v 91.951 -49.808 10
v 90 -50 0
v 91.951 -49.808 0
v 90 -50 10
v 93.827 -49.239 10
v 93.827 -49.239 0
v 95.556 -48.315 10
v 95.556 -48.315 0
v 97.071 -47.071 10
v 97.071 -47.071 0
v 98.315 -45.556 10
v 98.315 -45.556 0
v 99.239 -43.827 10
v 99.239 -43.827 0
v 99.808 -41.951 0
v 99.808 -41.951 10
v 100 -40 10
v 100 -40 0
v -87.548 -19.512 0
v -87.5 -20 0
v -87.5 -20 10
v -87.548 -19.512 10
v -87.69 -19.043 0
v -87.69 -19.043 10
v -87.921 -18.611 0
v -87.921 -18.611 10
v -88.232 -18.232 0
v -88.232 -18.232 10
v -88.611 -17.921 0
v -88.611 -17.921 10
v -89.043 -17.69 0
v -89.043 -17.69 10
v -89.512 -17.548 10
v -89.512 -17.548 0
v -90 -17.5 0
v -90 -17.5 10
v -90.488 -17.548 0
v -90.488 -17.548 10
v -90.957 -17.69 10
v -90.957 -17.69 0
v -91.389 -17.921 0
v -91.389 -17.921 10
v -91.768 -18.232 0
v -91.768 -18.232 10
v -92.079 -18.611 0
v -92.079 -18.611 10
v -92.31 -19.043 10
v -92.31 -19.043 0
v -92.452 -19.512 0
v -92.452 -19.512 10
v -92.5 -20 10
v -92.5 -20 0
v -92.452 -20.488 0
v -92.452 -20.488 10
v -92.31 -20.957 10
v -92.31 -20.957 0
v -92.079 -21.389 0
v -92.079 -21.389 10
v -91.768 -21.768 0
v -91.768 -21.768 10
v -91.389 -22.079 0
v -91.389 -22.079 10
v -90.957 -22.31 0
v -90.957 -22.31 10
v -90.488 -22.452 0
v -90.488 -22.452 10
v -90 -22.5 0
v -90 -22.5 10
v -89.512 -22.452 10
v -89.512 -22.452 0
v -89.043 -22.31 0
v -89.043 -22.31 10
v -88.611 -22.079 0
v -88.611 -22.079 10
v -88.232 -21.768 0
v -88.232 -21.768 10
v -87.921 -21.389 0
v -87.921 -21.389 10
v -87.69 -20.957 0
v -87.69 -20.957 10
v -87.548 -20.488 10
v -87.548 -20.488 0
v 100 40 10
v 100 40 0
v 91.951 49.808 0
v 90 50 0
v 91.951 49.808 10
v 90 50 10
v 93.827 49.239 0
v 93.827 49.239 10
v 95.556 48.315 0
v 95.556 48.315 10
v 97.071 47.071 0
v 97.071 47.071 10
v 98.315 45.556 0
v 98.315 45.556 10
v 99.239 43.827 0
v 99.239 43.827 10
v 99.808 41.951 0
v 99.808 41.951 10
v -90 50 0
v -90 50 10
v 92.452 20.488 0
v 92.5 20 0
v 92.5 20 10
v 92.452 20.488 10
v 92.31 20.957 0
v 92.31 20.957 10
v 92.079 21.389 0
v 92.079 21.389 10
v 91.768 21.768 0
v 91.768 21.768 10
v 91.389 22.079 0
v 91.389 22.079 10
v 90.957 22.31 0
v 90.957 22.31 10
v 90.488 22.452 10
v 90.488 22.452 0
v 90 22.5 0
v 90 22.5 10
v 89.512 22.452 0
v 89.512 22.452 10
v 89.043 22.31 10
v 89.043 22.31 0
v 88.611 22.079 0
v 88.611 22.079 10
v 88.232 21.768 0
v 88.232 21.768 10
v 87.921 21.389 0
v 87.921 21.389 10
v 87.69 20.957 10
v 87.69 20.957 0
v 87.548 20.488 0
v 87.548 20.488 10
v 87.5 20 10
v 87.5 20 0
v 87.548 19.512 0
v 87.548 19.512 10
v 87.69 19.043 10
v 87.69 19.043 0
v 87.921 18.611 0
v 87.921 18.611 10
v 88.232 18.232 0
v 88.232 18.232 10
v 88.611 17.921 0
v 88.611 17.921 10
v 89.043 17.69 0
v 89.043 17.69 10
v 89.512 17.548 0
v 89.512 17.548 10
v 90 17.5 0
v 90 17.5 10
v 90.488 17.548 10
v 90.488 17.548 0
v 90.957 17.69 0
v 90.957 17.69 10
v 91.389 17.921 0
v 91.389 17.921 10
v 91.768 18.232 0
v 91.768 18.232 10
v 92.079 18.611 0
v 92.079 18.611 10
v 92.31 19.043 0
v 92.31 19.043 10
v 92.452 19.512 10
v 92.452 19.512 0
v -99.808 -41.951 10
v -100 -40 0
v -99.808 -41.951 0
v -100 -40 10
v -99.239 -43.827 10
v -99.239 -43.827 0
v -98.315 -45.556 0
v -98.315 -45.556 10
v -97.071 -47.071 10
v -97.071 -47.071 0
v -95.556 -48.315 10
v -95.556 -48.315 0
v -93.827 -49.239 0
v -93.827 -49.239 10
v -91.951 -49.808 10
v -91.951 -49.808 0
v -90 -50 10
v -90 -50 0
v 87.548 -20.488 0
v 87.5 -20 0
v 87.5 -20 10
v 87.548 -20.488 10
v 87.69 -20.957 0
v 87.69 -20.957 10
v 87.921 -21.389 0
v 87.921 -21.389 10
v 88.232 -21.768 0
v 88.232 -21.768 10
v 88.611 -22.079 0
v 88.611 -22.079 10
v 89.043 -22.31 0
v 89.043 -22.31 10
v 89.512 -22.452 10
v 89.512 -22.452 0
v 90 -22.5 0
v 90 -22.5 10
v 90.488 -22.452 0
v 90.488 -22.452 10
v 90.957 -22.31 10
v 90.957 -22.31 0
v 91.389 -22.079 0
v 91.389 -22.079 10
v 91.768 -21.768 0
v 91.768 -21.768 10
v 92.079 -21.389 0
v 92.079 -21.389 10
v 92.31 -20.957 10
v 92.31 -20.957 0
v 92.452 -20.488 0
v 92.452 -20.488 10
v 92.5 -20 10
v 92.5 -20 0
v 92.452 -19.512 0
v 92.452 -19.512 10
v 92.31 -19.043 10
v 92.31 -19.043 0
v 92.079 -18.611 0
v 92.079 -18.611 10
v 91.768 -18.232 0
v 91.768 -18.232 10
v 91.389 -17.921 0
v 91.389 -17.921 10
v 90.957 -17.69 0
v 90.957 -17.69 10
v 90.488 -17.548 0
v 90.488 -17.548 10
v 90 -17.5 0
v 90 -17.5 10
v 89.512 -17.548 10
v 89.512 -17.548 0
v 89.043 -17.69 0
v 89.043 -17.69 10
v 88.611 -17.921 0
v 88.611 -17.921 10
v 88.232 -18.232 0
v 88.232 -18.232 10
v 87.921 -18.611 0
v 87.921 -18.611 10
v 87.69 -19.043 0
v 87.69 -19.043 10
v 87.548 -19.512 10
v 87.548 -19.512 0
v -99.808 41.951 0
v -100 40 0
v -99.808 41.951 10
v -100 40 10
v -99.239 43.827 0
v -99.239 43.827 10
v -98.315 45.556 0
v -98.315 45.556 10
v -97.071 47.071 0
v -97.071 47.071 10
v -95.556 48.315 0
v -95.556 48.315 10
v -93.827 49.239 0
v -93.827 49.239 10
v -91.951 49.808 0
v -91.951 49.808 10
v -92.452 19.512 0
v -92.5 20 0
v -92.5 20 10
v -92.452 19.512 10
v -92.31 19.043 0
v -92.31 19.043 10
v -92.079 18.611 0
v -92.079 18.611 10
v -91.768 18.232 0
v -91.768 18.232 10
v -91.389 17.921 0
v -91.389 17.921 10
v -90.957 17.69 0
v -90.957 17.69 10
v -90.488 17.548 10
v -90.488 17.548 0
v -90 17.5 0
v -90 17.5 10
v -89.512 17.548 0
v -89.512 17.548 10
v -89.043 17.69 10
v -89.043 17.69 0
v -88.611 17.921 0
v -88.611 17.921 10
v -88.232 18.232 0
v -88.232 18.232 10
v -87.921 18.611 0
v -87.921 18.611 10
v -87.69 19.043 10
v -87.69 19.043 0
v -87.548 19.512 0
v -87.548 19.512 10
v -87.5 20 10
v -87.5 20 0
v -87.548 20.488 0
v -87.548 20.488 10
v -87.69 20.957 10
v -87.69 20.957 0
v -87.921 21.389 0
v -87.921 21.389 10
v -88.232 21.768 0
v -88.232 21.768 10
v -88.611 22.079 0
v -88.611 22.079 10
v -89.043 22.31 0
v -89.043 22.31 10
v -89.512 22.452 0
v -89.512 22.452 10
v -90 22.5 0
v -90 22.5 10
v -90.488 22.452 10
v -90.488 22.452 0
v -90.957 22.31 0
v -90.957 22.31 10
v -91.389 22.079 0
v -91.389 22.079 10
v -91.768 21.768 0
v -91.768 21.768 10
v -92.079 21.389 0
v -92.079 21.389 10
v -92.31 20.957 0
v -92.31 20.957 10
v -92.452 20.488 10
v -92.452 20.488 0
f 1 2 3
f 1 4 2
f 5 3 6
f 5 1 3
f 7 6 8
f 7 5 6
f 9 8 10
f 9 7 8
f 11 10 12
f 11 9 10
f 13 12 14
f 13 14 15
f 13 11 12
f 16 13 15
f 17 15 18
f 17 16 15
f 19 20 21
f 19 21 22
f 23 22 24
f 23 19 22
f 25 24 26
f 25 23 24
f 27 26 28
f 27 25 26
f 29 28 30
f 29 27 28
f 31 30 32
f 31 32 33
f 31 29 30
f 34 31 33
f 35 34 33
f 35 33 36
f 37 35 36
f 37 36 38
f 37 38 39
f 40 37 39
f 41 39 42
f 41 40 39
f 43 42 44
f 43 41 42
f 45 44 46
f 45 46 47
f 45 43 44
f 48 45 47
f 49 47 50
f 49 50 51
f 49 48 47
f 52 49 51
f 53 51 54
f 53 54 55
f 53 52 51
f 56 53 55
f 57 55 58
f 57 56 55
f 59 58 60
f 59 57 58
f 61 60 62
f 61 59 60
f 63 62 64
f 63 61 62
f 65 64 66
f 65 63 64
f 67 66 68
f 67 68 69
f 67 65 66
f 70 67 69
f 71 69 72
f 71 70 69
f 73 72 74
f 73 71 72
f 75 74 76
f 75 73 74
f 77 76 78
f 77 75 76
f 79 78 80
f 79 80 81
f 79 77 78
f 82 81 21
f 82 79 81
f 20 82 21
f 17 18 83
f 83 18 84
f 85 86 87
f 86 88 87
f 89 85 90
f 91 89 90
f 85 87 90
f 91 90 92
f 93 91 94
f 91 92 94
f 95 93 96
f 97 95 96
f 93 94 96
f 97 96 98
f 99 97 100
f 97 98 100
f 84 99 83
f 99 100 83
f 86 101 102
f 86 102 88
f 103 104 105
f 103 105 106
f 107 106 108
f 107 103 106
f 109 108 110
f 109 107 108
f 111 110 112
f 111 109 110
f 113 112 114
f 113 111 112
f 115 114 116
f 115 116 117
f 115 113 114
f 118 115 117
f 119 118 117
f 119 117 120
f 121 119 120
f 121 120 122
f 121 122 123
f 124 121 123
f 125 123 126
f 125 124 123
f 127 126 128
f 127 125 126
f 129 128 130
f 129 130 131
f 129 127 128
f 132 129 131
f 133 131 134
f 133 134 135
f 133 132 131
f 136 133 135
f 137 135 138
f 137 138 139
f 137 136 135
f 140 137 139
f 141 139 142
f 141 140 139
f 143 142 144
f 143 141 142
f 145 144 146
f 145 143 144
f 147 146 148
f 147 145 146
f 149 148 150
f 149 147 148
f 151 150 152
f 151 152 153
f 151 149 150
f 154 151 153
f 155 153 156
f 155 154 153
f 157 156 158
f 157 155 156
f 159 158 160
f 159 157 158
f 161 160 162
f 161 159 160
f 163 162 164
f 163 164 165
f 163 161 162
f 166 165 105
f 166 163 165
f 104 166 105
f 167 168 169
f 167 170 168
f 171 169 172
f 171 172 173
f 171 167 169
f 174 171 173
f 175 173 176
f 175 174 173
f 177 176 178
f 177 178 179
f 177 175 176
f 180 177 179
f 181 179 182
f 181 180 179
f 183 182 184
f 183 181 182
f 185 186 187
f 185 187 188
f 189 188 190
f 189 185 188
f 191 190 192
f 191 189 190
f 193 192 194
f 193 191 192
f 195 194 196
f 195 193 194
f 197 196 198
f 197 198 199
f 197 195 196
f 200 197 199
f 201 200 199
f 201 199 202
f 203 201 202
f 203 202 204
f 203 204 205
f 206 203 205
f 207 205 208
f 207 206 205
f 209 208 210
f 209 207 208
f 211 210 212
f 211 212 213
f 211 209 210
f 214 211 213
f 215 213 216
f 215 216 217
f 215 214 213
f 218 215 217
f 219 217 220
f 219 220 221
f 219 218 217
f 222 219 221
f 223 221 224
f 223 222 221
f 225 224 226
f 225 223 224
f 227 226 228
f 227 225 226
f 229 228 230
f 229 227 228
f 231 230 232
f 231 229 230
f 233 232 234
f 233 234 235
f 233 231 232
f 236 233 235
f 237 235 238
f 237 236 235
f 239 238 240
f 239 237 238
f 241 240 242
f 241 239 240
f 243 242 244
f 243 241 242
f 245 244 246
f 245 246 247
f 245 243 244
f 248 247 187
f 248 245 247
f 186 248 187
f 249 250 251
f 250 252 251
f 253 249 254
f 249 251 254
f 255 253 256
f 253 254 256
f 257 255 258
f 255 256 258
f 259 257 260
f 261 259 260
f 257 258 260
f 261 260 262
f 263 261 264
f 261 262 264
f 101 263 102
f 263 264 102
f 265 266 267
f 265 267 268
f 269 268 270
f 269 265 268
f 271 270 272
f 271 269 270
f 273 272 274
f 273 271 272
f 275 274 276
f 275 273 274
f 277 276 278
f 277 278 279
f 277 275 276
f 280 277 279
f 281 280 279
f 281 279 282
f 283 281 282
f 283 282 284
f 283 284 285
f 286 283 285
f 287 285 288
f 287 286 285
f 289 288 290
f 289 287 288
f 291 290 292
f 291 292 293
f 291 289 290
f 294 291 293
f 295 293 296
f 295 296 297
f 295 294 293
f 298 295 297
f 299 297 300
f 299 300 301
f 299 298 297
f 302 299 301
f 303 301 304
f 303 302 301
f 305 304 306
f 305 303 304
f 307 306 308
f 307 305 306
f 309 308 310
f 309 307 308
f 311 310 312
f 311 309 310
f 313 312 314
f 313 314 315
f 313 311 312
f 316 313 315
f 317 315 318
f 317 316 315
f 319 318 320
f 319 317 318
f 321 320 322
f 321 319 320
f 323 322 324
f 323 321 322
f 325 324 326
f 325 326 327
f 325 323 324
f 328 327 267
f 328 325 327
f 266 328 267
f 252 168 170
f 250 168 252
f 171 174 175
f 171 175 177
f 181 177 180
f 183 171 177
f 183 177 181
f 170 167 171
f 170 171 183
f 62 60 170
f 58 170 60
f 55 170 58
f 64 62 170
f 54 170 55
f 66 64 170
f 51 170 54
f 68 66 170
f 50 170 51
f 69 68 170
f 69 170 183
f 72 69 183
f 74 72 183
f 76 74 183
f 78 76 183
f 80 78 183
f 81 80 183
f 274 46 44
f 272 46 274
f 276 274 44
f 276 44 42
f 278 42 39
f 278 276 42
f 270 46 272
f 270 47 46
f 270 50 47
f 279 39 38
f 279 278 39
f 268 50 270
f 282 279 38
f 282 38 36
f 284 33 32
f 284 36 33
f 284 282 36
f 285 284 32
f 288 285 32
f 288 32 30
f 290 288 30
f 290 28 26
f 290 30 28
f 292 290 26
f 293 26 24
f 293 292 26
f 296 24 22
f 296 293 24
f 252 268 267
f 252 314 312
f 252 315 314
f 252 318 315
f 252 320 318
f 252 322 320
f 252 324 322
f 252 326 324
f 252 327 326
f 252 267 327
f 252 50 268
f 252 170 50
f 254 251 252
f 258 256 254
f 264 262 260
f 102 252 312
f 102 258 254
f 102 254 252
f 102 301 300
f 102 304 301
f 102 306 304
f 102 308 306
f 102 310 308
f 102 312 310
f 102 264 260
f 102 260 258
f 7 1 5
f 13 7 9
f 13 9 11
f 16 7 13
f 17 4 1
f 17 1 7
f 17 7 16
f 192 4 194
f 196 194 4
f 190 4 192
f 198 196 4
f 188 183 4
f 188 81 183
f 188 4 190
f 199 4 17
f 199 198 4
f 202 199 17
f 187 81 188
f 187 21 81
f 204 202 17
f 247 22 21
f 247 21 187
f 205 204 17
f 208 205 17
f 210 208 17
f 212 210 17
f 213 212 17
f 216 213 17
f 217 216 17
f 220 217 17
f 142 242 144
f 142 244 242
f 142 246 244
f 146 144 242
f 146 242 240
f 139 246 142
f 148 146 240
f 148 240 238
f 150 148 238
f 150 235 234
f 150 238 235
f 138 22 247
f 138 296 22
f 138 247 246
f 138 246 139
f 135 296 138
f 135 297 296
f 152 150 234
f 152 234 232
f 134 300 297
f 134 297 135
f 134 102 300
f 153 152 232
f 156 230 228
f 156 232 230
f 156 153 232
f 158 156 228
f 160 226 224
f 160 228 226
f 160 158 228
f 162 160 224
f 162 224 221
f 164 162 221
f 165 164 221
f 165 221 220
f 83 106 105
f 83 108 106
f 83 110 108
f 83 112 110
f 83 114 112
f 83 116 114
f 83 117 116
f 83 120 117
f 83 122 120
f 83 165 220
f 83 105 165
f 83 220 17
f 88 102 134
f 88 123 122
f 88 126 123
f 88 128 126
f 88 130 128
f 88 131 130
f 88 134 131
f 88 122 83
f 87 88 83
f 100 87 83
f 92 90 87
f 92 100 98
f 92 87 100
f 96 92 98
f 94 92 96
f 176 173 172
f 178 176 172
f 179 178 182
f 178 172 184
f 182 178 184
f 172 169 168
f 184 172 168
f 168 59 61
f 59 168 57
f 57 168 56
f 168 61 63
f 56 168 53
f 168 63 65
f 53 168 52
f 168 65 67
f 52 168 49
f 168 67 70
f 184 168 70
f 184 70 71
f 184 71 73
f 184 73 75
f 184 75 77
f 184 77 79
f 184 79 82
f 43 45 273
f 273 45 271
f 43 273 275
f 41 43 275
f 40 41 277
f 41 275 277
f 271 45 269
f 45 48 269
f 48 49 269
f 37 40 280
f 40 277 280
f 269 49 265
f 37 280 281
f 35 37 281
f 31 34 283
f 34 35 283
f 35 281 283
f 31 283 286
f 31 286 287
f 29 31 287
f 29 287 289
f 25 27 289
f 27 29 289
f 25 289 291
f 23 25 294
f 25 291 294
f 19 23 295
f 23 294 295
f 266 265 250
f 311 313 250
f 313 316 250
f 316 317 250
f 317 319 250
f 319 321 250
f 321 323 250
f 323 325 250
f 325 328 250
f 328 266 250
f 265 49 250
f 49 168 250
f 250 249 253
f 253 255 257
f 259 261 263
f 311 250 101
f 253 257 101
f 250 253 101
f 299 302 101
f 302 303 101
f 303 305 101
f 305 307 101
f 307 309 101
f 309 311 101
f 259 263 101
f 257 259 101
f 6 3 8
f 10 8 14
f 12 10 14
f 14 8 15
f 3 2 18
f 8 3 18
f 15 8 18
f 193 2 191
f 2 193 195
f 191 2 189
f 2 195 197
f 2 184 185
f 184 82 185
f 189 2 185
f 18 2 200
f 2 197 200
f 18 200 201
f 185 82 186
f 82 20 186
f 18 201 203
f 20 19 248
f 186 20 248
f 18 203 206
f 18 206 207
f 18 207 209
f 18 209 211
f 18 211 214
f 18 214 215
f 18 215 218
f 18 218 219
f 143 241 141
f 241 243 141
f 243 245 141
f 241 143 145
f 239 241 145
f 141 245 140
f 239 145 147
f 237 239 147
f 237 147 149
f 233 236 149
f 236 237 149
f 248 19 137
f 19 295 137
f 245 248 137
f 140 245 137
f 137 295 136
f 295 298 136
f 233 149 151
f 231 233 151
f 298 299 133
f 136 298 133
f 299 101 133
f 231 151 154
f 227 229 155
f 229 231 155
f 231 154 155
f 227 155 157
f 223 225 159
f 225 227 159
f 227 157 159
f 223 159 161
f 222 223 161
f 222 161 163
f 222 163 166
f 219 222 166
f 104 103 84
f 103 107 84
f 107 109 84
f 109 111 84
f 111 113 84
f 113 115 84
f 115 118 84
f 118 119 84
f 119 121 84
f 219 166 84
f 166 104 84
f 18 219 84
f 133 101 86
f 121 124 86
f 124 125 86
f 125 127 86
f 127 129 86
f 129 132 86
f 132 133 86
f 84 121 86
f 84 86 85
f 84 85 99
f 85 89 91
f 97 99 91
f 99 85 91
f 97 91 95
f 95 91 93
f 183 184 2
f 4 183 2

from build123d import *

# Parameters (mm, degrees)
SKETCH1_W           = 200
SKETCH1_H           = 100
SKETCH1_R           = 2.5
BOSS_EXTRUDE1_DEPTH = 10
FILLET1_R           = 10


with BuildPart() as part:
    # Sketch1 → Boss-Extrude1 (new body)
    with BuildSketch(Plane.XY):
        Rectangle(SKETCH1_W, SKETCH1_H)
        with Locations((90, 20)):
            Circle(SKETCH1_R, mode=Mode.SUBTRACT)
        with Locations(Location((-90, 20, 0), (0, 0, 180))):
            Circle(SKETCH1_R, mode=Mode.SUBTRACT)
        with Locations(Location((90, -20, 0), (0, 0, 180))):
            Circle(SKETCH1_R, mode=Mode.SUBTRACT)
        with Locations((-90, -20)):
            Circle(SKETCH1_R, mode=Mode.SUBTRACT)
    extrude(amount=BOSS_EXTRUDE1_DEPTH)

    # Fillet1
    fillet1_edges = [part.edges().sort_by_distance(p)[0] for p in [
        (100, -50, 5),
        (-100, -50, 5),
        (-100, 50, 5),
        (100, 50, 5),
    ]]
    fillet(fillet1_edges, radius=FILLET1_R)


solid = part.part
